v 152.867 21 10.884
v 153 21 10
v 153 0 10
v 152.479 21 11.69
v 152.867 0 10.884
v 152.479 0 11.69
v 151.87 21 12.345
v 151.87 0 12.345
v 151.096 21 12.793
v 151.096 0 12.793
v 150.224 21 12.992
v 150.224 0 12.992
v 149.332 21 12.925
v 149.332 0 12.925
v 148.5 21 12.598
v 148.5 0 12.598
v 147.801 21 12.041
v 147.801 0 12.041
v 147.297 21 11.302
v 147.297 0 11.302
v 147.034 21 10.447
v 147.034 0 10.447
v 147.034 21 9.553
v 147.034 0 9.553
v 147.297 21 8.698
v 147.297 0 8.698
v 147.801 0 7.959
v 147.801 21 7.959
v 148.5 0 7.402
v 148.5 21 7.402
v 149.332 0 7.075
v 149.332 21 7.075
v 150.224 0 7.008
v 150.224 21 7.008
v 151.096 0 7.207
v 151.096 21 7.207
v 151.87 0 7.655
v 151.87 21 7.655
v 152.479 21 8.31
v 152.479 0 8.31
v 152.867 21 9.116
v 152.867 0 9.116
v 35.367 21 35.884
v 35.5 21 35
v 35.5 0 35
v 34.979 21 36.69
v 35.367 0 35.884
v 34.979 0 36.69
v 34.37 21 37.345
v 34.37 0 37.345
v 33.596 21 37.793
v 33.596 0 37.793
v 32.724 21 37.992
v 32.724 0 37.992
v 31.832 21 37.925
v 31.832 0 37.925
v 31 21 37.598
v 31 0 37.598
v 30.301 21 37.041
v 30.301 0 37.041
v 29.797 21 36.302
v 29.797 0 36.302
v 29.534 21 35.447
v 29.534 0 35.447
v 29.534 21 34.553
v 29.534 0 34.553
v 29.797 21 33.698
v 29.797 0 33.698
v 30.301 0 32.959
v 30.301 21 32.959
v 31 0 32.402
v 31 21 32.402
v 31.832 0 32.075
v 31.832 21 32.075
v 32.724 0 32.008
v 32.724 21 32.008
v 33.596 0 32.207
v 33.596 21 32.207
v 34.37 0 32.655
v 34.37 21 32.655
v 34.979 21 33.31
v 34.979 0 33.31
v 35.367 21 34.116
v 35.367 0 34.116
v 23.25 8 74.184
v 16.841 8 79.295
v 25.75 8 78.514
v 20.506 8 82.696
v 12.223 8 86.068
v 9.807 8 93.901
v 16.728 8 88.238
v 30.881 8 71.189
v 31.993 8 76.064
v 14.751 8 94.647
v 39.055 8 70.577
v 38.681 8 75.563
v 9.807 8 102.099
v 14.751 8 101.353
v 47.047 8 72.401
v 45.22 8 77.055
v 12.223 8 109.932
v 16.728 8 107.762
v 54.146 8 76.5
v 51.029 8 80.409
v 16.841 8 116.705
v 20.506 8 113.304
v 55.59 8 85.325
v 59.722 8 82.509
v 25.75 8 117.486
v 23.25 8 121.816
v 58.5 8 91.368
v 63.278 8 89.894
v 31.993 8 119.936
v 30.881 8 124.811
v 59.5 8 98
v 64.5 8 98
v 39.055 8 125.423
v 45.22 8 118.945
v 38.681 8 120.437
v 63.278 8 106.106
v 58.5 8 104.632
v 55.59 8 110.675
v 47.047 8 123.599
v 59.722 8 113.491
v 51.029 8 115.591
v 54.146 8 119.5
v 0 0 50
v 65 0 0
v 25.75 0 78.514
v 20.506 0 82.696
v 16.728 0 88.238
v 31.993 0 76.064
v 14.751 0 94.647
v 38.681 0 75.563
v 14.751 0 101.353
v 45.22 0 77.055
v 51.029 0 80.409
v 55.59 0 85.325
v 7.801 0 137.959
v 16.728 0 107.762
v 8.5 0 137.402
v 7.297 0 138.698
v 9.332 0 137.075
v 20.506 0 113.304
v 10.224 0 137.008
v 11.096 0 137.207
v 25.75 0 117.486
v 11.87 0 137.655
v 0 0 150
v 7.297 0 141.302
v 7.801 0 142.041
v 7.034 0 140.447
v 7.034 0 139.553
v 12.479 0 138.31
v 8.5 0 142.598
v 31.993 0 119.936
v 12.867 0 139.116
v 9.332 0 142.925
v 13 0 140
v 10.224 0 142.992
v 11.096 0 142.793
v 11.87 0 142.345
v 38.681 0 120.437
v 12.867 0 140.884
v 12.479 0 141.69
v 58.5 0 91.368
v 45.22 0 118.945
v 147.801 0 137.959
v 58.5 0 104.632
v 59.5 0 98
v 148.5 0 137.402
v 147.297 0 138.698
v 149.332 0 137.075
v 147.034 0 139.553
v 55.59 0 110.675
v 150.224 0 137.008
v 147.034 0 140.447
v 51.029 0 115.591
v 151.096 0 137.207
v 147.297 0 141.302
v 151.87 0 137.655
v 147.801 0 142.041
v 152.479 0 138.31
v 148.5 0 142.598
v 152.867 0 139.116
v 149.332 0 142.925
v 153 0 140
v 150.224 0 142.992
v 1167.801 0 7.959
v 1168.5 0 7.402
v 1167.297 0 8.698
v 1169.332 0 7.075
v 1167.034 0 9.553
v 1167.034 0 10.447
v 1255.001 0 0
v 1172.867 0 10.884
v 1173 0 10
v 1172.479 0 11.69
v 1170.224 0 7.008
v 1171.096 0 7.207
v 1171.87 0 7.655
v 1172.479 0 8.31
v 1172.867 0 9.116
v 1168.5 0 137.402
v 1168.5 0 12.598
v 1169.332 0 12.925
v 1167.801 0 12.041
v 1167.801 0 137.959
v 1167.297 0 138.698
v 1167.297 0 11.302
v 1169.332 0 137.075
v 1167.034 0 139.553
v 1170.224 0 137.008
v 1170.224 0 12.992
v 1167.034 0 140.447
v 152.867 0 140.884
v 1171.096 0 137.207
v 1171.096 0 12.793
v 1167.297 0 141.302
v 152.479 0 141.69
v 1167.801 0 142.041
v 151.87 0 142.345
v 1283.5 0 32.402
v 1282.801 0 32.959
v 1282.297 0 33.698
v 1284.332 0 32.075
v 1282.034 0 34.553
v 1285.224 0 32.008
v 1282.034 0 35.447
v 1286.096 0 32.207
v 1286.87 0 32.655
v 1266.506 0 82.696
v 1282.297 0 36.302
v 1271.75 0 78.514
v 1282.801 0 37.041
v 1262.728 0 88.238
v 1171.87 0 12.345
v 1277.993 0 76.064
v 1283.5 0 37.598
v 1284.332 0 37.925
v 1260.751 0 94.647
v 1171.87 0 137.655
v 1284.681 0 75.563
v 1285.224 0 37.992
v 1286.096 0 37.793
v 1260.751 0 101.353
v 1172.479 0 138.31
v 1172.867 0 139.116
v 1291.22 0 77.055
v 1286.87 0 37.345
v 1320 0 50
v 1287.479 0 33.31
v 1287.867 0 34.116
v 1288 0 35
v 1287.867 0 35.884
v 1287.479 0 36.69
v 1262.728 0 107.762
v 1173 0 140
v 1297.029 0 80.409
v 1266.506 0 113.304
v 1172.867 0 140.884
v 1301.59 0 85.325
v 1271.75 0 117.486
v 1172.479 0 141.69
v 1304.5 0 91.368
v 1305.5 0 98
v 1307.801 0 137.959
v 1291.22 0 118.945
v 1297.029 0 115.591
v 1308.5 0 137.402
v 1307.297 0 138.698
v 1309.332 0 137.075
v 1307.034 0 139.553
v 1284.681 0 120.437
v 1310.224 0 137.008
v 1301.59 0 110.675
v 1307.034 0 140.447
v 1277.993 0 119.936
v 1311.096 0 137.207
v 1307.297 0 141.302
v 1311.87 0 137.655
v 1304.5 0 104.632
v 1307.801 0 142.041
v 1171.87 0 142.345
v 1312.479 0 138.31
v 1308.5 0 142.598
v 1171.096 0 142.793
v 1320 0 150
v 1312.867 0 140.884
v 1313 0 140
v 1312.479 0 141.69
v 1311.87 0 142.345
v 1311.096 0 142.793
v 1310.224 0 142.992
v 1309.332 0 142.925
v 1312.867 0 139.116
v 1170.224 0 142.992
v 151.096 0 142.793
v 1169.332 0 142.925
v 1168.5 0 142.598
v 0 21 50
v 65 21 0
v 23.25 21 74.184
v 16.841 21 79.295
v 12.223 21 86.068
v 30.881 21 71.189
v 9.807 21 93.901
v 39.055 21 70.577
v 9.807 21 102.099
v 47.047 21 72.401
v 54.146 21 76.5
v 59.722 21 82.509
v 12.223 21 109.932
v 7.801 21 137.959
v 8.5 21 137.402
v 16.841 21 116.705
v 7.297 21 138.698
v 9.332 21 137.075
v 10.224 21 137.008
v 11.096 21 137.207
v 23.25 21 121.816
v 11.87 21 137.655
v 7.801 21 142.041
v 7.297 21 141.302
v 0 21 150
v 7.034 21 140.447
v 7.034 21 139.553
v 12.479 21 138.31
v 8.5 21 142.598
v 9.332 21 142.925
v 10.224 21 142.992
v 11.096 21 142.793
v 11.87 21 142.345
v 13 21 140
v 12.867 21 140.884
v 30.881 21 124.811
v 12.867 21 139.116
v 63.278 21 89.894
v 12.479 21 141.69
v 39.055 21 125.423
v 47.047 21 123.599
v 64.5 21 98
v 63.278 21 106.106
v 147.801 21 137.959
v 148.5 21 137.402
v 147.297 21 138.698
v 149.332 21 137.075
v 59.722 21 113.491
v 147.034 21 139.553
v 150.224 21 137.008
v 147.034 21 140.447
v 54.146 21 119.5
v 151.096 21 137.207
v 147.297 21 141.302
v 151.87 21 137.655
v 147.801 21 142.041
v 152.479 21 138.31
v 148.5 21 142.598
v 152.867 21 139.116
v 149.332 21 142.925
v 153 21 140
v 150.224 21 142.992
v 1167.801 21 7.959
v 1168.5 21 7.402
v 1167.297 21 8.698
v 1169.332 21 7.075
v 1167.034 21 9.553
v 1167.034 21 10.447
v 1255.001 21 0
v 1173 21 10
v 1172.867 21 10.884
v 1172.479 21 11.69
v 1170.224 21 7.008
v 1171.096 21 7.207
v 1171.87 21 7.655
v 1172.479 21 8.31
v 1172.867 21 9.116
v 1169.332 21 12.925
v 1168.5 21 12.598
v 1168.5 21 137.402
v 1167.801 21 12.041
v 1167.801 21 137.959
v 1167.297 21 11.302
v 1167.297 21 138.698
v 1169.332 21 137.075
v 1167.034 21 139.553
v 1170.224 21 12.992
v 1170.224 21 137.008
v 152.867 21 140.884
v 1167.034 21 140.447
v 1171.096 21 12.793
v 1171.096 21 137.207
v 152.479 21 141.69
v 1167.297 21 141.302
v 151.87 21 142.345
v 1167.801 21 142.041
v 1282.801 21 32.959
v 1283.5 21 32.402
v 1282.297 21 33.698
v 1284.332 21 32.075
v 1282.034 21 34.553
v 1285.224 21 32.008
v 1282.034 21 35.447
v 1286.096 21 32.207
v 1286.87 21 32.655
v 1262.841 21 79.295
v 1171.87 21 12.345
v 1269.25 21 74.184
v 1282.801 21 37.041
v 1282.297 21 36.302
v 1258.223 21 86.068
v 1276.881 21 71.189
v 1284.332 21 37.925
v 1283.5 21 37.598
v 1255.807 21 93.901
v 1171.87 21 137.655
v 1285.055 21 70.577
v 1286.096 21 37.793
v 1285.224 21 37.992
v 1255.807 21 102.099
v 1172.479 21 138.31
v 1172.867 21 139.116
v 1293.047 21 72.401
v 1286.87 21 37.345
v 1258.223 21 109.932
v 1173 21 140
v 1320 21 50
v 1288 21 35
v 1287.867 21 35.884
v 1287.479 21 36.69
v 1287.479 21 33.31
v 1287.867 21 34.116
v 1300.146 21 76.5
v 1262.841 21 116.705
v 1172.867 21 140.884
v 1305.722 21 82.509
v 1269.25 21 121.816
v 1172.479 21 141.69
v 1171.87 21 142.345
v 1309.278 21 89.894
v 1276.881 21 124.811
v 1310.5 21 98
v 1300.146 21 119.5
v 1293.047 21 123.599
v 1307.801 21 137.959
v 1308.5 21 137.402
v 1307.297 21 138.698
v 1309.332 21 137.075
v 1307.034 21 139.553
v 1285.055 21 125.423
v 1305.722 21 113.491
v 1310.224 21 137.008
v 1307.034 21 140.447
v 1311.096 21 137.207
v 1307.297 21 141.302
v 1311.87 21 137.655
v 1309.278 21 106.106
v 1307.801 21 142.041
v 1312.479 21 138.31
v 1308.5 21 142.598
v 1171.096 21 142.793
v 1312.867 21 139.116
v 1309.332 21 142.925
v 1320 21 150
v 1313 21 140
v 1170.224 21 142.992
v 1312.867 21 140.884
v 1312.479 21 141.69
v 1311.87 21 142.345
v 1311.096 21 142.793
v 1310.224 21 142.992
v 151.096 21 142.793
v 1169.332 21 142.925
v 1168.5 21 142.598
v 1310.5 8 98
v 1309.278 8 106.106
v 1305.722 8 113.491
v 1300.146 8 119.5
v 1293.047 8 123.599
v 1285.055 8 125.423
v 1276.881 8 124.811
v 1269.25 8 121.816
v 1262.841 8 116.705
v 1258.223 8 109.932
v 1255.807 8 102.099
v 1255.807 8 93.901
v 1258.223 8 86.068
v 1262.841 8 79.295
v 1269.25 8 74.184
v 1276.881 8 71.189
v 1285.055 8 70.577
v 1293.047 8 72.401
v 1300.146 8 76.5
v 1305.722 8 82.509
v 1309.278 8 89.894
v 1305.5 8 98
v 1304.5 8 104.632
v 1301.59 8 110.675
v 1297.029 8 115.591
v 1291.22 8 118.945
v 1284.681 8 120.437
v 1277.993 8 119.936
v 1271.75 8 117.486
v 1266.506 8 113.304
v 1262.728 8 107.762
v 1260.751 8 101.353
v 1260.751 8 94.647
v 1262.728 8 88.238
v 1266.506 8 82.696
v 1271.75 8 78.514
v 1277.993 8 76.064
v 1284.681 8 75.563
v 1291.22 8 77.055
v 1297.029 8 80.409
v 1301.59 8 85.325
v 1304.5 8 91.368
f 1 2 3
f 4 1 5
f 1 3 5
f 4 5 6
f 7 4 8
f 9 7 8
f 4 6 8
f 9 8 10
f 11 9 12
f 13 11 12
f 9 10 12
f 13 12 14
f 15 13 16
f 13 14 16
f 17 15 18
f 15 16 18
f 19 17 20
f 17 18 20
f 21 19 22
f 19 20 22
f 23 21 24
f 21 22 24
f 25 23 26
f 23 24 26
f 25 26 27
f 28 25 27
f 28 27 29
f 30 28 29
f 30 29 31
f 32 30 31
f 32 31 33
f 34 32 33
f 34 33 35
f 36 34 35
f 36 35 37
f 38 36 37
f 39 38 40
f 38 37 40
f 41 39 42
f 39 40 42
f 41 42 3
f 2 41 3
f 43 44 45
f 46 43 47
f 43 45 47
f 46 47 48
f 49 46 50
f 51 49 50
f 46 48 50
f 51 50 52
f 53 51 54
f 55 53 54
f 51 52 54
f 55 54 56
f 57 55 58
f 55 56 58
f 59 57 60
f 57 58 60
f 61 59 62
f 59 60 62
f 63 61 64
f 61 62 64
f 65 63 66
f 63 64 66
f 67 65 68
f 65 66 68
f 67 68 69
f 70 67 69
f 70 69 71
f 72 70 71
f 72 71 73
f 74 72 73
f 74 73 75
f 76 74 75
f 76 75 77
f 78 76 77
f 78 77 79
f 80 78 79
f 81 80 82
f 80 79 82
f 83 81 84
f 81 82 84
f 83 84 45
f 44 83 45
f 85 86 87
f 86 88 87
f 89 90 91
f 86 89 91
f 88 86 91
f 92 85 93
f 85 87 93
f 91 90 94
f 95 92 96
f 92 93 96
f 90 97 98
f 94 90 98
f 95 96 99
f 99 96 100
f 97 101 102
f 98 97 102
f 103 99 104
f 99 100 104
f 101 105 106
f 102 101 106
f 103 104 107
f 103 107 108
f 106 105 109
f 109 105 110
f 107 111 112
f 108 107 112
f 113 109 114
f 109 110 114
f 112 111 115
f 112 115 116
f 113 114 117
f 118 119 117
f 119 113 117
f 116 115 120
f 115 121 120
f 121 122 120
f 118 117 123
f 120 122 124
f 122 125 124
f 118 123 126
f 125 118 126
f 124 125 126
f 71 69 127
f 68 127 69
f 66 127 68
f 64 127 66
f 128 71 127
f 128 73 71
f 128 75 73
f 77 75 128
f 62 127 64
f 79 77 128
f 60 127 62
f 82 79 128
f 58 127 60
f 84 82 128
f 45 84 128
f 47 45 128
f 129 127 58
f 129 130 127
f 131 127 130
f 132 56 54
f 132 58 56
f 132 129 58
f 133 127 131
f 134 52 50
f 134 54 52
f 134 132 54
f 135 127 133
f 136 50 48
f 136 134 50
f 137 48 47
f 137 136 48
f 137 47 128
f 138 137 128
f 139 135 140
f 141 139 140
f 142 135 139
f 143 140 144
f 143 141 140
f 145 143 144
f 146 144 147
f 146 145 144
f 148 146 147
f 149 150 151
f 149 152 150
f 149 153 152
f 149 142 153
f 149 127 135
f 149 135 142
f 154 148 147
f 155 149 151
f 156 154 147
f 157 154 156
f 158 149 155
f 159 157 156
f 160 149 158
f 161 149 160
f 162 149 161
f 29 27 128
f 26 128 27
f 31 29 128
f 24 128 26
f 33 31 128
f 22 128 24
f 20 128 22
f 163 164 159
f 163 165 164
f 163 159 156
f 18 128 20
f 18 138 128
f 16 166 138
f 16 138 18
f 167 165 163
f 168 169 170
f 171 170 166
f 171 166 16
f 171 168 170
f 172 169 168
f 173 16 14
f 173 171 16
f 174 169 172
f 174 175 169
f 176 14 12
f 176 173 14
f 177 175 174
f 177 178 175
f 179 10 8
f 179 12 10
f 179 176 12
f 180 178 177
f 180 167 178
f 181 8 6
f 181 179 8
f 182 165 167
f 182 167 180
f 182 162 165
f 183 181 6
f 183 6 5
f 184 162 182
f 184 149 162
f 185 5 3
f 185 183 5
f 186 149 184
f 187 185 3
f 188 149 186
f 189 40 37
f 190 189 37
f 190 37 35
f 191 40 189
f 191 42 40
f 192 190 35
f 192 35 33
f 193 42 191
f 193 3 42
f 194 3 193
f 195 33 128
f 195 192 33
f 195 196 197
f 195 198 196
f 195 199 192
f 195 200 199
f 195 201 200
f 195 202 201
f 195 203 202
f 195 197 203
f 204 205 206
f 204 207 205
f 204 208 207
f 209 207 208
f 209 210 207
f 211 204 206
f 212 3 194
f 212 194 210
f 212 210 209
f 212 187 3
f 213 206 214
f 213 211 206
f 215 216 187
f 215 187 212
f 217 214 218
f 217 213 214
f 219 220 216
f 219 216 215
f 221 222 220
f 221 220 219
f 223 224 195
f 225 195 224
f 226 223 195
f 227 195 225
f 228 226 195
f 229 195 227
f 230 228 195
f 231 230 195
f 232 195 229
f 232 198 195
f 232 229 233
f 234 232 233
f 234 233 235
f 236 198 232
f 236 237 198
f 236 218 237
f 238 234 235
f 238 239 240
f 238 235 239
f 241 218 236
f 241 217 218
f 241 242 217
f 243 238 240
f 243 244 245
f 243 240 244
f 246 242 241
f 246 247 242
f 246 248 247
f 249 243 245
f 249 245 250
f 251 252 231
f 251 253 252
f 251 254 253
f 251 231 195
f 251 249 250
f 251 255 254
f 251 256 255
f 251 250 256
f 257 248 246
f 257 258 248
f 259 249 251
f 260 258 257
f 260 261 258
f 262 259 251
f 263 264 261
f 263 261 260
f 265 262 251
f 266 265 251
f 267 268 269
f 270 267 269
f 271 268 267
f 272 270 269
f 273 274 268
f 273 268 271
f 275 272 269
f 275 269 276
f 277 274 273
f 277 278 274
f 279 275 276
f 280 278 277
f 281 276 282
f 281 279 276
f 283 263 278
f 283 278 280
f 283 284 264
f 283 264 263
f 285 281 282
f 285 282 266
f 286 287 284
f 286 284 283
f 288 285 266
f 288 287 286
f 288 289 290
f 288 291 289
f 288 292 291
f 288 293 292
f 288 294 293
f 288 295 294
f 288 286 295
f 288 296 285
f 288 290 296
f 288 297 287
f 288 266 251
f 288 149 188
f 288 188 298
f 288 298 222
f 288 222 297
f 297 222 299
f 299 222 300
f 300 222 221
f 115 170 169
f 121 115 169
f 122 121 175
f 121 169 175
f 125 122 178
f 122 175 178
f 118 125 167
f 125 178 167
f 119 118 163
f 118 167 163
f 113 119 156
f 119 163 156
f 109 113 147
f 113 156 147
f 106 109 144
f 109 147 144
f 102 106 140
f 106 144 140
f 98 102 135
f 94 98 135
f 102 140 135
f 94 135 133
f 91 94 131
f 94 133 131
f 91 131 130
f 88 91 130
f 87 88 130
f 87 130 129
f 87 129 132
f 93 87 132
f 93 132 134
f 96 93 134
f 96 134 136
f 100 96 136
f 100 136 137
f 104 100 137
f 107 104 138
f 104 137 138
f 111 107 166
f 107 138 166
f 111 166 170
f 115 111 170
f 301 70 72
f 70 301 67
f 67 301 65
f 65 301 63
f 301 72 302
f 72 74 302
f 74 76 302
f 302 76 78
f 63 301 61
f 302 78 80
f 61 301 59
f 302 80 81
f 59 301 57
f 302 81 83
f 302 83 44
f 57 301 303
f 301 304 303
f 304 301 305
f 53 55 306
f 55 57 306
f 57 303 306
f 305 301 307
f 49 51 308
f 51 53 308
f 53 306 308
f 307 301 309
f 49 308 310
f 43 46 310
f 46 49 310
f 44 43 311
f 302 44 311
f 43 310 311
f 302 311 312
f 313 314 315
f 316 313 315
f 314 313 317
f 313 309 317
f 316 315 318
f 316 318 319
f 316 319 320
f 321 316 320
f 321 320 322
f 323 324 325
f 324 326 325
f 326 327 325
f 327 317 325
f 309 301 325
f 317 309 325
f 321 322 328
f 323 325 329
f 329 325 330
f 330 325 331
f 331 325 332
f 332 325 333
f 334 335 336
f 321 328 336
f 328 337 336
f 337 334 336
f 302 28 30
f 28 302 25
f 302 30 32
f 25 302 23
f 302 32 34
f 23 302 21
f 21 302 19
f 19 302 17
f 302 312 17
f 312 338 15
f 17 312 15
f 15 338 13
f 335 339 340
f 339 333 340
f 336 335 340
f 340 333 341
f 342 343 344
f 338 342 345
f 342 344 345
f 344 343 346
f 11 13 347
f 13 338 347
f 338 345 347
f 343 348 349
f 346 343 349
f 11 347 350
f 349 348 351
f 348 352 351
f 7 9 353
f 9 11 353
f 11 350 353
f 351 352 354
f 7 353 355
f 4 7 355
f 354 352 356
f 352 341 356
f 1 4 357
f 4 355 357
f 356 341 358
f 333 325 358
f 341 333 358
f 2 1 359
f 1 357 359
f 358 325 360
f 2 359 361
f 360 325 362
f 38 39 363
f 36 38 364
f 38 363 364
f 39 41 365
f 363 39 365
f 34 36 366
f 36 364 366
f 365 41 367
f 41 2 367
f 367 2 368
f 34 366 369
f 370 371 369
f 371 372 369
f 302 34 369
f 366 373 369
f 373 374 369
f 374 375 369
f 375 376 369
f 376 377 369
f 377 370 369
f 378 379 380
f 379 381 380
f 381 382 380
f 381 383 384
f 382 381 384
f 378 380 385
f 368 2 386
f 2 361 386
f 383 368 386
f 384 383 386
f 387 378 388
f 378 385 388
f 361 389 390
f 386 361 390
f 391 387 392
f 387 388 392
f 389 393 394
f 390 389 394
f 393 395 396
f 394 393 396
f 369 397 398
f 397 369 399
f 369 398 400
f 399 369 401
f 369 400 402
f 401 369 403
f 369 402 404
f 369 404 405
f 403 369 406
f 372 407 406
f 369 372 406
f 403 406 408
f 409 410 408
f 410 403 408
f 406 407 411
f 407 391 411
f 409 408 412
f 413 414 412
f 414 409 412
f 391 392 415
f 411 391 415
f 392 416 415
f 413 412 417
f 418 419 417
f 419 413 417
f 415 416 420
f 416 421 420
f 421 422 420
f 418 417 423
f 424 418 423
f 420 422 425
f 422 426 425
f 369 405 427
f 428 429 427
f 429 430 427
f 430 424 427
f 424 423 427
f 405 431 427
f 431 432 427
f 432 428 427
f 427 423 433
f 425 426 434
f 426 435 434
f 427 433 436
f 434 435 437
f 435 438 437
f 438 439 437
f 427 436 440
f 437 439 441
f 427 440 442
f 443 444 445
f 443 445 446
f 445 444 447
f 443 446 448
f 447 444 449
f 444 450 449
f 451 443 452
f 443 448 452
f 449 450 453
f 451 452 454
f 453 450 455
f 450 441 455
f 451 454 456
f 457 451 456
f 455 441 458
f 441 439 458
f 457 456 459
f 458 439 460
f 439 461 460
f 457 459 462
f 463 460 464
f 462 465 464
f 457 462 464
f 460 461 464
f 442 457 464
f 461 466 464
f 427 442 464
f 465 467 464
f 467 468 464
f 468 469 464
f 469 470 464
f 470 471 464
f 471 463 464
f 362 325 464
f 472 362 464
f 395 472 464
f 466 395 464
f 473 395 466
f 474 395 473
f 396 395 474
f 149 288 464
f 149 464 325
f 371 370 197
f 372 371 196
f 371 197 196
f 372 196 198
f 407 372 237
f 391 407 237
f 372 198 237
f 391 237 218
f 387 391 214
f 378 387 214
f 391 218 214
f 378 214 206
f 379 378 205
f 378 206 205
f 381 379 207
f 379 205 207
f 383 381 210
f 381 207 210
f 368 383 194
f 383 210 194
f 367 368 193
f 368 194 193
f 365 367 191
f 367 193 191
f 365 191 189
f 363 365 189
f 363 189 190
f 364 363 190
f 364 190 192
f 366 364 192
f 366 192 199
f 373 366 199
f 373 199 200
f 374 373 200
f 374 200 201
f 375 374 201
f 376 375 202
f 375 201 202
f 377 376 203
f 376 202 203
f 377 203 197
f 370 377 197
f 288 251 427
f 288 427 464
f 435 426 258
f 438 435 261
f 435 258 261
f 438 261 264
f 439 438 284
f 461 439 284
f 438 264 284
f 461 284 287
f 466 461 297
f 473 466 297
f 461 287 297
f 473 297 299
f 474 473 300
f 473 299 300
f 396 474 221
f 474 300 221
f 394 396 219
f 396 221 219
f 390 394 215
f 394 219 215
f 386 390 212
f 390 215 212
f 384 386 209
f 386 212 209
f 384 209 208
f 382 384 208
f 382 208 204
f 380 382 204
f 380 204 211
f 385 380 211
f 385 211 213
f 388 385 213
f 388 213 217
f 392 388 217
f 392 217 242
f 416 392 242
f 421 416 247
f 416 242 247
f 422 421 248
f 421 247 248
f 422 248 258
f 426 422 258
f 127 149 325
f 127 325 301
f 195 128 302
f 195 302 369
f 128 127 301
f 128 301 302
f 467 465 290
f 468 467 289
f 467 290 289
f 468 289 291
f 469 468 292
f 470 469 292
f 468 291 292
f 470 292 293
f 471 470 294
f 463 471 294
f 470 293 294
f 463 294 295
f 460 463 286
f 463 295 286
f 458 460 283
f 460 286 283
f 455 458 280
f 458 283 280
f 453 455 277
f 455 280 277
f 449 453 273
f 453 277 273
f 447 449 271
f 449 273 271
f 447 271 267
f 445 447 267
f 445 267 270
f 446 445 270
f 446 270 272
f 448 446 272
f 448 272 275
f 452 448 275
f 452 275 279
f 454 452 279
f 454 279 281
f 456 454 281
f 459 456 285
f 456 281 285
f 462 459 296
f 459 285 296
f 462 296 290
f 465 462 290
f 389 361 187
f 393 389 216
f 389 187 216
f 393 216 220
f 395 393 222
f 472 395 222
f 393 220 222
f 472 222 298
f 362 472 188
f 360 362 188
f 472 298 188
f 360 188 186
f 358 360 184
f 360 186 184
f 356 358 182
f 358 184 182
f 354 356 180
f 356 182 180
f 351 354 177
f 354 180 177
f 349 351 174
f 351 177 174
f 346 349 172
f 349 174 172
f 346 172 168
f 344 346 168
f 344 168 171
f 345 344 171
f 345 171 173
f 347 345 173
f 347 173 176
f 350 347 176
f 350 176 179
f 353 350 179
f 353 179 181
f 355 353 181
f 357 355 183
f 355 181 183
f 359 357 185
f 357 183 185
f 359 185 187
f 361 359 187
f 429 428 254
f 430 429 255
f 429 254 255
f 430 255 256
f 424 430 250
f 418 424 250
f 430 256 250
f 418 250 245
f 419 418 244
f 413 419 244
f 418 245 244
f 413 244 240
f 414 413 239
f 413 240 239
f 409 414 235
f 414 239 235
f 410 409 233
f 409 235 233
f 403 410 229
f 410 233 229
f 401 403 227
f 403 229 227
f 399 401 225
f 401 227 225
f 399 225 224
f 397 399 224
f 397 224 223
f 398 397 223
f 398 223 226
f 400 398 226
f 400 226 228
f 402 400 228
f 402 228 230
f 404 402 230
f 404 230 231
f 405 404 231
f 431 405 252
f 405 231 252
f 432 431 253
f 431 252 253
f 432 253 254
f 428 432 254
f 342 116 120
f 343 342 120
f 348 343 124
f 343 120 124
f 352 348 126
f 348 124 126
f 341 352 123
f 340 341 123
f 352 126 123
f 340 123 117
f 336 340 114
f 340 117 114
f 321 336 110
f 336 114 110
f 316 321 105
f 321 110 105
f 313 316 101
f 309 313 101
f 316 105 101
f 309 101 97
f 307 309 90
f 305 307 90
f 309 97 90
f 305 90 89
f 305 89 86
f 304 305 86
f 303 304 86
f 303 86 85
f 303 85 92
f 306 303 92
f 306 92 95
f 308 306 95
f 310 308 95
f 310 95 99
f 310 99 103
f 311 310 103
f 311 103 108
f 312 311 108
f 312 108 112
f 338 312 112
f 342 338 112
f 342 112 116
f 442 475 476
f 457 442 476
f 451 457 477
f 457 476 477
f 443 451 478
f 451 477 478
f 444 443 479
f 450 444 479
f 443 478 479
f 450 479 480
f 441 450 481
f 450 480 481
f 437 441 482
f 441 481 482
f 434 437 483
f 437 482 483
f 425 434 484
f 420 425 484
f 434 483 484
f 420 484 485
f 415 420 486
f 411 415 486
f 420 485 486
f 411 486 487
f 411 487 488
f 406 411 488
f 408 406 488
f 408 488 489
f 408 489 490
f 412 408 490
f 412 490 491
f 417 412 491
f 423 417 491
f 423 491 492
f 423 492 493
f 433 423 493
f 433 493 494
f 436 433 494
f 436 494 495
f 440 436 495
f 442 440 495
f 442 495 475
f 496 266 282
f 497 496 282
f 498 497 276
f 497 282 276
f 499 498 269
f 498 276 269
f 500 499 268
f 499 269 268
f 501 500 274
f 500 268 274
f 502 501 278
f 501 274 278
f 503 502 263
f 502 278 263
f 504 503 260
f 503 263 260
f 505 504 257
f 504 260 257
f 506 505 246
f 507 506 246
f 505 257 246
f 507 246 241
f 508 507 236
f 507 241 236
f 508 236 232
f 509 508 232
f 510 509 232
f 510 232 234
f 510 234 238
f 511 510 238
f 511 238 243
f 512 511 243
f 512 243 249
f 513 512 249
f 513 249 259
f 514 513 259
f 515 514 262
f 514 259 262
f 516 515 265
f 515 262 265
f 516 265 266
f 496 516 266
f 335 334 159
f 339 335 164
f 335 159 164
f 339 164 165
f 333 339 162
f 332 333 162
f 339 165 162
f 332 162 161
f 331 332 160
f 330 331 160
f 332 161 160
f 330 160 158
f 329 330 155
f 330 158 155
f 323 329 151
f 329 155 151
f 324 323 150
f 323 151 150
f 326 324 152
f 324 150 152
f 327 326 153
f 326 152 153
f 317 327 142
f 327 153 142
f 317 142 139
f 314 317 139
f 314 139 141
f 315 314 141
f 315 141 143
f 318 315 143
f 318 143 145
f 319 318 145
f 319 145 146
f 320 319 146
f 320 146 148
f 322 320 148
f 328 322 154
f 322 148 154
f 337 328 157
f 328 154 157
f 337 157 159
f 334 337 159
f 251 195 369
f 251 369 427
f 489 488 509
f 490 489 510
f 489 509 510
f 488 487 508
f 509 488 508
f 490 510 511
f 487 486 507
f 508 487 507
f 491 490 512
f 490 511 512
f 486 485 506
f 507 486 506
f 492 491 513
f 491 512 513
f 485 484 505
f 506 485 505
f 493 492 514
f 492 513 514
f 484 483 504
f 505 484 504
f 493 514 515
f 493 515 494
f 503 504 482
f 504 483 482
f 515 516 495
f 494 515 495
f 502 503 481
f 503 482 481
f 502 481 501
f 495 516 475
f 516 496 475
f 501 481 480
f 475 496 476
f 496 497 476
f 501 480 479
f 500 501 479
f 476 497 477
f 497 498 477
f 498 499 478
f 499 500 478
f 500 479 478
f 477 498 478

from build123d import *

# Parameters (mm, degrees)
F0_R     = 3
F0_R_2   = 27.5
F1_DEPTH = 21
F2_R     = 27.5
F2_R_2   = 22.5
F3_DEPTH = 8


# Not quite as in the source:
# - a feature names something its author has since deleted; it is built from what else it names


with BuildPart() as f1:
    # F0 (on Front) → F1 (new body)
    with BuildSketch(Plane.XZ):
        Polygon((0, 50), (65, 0), (160, 0), (1255.0009576903, 0), (1320, 50), (1320, 150), (160, 150), (0, 150), (0, 120), align=None)
        with Locations((150, 10)):
            Circle(F0_R, mode=Mode.SUBTRACT)
        with Locations((32.5, 35)):
            Circle(F0_R, mode=Mode.SUBTRACT)
        with Locations((1170, 10)):
            Circle(F0_R, mode=Mode.SUBTRACT)
        with Locations((1285, 35)):
            Circle(F0_R, mode=Mode.SUBTRACT)
        with Locations((37, 98)):
            Circle(F0_R_2, mode=Mode.SUBTRACT)
        with Locations((10, 140)):
            Circle(F0_R, mode=Mode.SUBTRACT)
        with Locations((150, 140)):
            Circle(F0_R, mode=Mode.SUBTRACT)
        with Locations((1283, 98)):
            Circle(F0_R_2, mode=Mode.SUBTRACT)
        with Locations((1170, 140)):
            Circle(F0_R, mode=Mode.SUBTRACT)
        with Locations((1310, 140)):
            Circle(F0_R, mode=Mode.SUBTRACT)
    extrude(amount=-F1_DEPTH)

    # F2 (on face) → F3 (join)
    with BuildSketch(Plane.XZ):
        with Locations((1283, 98)):
            Circle(F2_R)
        with Locations((1283, 98)):
            Circle(F2_R_2, mode=Mode.SUBTRACT)
        with Locations((37, 98)):
            Circle(F2_R)
        with Locations((37, 98)):
            Circle(F2_R_2, mode=Mode.SUBTRACT)
    extrude(amount=-F3_DEPTH)


solid = f1.part
